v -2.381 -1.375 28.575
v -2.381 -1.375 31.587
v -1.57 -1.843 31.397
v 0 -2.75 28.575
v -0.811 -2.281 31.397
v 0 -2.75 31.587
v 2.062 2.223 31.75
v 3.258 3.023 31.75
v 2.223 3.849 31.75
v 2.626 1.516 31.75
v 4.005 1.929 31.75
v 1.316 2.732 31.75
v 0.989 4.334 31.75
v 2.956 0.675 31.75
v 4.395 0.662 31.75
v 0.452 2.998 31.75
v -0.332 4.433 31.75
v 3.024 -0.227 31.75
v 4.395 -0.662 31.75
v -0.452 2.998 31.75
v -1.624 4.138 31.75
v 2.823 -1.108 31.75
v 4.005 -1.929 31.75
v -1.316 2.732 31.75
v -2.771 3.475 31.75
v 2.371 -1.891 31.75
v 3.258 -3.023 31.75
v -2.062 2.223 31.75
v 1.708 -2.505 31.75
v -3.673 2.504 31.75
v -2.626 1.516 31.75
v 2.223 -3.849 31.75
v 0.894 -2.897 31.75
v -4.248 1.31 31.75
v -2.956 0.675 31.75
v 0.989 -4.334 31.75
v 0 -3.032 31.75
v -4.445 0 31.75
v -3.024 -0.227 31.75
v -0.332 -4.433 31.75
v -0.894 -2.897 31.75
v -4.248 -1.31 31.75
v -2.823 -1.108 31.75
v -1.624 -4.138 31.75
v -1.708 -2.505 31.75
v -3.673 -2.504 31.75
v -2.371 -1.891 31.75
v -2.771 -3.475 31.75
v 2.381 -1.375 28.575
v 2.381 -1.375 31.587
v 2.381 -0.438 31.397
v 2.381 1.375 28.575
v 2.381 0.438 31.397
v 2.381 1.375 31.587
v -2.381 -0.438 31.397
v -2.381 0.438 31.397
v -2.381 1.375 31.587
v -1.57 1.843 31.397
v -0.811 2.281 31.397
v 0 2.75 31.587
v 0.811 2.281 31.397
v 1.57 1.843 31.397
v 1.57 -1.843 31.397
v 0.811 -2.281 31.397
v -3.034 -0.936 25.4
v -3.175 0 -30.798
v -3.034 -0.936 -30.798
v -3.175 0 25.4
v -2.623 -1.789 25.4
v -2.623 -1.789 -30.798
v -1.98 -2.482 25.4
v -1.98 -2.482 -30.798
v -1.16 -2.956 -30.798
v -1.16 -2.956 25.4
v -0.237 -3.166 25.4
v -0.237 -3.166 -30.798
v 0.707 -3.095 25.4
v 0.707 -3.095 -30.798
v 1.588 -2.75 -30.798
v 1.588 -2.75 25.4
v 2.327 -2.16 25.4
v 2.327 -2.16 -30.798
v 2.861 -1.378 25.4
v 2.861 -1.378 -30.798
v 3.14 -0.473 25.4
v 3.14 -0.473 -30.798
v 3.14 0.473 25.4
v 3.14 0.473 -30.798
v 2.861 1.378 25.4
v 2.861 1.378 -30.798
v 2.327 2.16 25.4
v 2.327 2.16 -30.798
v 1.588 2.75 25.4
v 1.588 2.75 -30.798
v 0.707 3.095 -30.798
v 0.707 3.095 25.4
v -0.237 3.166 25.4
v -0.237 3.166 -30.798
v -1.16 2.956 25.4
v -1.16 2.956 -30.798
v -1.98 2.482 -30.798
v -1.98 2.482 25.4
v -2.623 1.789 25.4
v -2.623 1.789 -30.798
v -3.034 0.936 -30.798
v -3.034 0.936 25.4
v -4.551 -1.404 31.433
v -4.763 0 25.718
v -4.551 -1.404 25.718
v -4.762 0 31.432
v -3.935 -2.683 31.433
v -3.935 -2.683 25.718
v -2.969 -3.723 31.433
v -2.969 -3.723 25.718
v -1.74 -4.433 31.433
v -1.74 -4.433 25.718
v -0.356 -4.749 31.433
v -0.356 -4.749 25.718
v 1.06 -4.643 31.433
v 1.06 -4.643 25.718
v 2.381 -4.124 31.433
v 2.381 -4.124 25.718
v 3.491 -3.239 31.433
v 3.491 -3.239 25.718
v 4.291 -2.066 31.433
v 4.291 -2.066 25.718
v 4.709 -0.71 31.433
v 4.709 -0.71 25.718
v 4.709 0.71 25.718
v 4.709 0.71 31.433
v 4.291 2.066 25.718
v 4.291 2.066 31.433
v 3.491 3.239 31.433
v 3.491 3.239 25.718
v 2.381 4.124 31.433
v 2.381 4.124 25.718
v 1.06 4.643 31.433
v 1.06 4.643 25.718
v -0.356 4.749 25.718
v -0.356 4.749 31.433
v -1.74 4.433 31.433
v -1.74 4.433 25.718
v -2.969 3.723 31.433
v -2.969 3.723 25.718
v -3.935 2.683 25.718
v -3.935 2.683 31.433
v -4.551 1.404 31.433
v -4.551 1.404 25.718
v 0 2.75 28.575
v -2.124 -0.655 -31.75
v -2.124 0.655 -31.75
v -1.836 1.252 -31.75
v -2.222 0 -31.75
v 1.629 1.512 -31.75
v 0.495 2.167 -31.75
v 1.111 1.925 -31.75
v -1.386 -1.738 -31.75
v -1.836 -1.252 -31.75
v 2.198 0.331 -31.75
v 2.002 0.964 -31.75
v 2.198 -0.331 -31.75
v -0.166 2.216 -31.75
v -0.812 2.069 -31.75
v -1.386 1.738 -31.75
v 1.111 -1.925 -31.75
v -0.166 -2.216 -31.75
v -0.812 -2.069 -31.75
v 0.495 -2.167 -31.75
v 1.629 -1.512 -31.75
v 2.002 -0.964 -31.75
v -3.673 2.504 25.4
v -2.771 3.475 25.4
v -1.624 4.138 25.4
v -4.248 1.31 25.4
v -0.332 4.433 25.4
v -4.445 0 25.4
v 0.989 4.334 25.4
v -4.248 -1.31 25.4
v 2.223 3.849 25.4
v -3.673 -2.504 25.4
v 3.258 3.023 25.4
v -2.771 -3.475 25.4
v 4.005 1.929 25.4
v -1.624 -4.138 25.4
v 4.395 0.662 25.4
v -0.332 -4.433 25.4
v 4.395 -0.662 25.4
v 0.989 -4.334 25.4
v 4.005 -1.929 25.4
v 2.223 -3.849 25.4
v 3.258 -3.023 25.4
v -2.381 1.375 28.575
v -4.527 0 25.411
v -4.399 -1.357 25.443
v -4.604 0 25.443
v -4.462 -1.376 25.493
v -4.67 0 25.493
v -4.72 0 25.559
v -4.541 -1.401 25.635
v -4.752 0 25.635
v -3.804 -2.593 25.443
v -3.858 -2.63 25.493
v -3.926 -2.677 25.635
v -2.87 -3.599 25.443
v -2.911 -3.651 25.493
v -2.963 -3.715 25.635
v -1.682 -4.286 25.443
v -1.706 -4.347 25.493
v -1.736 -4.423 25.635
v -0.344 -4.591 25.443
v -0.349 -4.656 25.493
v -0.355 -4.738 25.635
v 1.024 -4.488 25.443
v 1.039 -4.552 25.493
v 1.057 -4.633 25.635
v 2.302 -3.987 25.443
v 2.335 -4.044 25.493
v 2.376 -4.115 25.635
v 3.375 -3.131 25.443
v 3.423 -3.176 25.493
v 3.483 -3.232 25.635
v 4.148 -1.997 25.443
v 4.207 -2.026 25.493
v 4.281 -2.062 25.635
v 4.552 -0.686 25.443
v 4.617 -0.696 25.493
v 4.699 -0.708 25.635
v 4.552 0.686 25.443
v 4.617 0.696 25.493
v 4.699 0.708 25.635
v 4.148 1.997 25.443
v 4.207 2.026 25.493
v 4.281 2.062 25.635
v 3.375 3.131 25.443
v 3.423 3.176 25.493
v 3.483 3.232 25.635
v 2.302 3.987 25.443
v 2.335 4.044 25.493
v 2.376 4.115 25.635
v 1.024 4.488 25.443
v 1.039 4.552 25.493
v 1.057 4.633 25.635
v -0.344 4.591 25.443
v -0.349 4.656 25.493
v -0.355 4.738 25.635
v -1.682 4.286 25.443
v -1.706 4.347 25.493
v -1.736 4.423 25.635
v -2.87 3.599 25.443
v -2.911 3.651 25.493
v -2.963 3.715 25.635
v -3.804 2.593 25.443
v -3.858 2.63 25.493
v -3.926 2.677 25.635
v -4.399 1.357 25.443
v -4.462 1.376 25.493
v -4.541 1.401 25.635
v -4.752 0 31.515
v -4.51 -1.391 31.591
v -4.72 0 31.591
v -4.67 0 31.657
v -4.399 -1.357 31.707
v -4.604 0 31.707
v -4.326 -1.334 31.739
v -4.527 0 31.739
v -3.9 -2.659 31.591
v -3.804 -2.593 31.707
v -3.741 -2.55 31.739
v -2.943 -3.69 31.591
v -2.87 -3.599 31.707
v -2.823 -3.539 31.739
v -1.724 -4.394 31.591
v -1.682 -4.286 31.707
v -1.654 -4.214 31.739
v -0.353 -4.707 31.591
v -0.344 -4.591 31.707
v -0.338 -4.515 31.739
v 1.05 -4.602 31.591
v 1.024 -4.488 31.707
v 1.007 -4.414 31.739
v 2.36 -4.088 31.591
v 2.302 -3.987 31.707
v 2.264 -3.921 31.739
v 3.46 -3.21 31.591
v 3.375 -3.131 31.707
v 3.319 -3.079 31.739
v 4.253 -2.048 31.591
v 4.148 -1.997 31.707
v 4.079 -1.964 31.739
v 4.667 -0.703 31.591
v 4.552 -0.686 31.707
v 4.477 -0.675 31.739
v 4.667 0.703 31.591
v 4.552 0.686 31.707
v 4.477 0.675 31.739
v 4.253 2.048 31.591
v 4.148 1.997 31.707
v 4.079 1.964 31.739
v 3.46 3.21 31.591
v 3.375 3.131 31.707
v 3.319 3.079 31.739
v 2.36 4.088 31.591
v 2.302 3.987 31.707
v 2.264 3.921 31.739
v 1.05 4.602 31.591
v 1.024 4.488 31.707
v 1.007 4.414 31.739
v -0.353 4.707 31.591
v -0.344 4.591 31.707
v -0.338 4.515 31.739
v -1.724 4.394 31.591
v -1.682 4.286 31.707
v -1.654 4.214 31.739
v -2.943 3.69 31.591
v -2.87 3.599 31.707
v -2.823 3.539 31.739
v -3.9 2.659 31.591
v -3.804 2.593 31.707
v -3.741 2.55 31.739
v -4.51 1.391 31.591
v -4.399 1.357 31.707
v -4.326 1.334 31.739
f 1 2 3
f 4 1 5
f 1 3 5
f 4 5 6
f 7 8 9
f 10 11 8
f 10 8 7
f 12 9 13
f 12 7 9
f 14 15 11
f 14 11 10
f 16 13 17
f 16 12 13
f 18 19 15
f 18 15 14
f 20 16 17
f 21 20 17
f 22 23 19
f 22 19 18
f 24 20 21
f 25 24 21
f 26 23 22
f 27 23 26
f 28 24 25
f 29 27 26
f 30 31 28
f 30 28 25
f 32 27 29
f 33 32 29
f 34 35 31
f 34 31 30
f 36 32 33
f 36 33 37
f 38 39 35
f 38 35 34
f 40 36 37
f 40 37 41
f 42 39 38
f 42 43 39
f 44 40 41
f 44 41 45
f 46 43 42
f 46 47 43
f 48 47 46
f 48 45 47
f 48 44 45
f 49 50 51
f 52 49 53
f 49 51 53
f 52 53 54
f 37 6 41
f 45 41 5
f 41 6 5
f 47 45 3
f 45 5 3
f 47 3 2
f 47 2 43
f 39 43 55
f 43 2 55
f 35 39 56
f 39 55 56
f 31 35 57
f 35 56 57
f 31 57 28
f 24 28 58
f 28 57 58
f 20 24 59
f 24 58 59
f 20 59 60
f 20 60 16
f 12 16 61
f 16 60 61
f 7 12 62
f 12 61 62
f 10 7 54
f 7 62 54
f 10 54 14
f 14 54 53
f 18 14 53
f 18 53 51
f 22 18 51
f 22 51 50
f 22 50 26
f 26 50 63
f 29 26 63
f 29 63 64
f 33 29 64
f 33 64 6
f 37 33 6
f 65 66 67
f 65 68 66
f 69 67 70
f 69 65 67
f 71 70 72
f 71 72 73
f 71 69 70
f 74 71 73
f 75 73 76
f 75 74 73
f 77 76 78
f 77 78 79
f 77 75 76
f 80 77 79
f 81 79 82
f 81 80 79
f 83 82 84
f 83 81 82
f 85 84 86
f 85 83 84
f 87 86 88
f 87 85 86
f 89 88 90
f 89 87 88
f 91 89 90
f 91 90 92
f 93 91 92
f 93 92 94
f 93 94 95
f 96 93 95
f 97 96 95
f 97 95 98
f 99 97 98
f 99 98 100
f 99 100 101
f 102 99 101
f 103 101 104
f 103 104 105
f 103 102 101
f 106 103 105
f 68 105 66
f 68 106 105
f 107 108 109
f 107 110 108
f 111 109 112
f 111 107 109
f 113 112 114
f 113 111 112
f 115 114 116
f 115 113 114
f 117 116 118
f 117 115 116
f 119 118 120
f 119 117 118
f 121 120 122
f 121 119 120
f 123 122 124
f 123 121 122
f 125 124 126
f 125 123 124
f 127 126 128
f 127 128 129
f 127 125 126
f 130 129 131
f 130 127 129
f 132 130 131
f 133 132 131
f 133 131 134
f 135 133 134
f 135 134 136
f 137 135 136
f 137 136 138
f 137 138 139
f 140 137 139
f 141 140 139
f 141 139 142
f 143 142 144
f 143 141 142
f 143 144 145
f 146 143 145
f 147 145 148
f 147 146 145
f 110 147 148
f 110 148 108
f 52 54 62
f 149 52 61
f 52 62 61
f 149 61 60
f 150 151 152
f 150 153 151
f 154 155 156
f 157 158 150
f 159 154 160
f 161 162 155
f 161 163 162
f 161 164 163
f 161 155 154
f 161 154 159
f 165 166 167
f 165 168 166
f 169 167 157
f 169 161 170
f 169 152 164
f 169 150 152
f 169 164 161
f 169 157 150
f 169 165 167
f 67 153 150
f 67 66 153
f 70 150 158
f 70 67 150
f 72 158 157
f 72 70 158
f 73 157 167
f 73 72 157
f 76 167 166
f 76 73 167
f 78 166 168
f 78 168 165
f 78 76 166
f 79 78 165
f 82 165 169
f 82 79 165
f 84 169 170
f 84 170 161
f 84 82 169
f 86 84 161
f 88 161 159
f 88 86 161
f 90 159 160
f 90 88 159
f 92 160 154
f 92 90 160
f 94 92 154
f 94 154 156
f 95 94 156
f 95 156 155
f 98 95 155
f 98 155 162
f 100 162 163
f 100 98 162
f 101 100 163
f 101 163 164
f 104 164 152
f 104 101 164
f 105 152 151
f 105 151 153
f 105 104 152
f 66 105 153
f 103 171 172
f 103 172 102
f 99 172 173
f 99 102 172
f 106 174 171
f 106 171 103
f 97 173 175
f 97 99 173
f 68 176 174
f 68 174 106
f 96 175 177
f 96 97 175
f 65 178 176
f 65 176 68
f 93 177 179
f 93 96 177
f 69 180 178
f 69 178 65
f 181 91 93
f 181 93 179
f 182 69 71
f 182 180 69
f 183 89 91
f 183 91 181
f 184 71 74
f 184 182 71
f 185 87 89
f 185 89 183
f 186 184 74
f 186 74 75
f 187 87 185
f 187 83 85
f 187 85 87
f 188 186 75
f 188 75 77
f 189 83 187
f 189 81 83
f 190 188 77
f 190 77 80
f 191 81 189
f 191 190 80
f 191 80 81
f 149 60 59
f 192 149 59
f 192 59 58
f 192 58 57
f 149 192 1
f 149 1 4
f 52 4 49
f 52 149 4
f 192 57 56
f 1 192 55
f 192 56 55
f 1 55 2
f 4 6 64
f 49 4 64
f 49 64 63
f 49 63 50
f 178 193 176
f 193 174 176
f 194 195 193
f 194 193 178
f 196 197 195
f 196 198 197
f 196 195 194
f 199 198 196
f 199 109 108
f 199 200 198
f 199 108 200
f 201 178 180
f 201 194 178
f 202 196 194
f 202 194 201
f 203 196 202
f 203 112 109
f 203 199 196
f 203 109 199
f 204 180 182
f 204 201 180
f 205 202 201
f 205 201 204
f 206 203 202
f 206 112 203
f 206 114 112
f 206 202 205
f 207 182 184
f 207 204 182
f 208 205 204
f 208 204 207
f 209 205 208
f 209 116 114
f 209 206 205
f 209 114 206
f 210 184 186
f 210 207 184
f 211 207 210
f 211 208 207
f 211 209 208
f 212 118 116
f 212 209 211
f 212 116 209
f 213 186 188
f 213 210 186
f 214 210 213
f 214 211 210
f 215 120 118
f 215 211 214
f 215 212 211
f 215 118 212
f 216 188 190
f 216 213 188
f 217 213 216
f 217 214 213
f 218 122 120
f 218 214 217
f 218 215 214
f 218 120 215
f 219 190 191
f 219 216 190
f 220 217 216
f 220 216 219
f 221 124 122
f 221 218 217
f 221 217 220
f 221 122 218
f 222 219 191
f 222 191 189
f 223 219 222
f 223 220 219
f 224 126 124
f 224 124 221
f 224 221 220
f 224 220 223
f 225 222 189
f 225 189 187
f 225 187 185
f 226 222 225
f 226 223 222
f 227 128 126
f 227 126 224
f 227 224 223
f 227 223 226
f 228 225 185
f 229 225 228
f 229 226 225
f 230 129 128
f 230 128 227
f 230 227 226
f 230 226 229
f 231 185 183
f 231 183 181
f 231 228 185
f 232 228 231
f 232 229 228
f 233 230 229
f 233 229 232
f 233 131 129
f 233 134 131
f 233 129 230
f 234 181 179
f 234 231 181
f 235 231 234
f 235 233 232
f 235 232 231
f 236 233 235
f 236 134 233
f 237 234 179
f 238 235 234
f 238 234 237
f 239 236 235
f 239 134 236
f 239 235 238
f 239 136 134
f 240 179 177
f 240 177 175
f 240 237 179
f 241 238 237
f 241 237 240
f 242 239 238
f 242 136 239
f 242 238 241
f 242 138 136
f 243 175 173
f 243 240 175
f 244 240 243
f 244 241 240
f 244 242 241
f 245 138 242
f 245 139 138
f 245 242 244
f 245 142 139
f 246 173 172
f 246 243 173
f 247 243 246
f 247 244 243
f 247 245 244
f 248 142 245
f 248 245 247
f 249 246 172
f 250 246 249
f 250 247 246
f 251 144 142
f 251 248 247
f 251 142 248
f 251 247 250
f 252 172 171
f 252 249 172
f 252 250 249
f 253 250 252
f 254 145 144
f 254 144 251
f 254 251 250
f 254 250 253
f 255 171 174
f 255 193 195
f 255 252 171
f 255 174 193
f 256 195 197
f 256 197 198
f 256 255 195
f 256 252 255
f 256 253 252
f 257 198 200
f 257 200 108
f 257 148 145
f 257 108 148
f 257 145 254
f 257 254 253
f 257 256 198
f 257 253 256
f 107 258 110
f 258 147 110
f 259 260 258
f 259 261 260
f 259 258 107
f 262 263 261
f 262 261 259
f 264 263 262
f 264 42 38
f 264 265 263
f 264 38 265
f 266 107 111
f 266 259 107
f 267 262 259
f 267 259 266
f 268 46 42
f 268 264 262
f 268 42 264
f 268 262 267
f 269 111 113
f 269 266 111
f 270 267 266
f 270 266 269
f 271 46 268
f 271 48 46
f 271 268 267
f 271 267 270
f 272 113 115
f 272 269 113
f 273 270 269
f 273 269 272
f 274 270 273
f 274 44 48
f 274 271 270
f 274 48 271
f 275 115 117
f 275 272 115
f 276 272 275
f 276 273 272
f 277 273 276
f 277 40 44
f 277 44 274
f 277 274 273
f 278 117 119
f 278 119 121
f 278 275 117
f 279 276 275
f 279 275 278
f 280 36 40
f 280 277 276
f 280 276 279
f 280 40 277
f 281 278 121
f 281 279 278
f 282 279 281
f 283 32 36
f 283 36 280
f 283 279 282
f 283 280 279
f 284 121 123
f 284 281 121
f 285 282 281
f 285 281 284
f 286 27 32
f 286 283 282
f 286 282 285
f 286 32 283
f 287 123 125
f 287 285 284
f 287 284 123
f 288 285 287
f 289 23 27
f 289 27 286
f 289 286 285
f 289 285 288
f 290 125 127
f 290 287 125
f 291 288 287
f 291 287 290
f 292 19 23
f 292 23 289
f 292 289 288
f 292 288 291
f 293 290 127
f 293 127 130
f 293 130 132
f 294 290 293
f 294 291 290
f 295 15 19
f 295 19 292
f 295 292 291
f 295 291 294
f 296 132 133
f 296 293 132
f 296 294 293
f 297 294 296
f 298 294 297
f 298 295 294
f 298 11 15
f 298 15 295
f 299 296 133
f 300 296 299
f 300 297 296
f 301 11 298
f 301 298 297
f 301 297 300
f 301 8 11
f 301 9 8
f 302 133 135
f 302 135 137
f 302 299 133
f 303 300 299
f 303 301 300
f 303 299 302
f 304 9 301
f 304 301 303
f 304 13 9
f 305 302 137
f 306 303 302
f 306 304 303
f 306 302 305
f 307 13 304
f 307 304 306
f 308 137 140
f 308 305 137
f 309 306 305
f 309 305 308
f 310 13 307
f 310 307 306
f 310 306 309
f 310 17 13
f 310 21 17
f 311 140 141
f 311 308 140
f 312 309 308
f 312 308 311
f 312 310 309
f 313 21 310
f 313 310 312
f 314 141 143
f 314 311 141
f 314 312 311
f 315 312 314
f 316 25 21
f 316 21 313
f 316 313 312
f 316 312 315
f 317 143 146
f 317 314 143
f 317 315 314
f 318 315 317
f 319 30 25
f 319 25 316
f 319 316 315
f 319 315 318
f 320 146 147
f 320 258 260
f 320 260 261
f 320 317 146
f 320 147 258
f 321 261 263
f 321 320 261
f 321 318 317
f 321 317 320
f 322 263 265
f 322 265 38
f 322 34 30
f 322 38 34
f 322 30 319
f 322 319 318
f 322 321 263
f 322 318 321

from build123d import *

# Parameters (mm, degrees)
CUT_EXTRUDE1_START = 31.75
CUT_EXTRUDE1_DEPTH = 3.175


with BuildPart() as part:
    # Sketch2 → Revolve1 (revolve)
    with BuildSketch(Plane(origin=(0, 0, 0), x_dir=(0, 0, -1), z_dir=(1, 0, 0)), mode=Mode.PRIVATE) as revolve1_sk:
        with BuildLine():
            Line((31.75, 0), (31.75, 2.2225))
            Line((31.75, 2.2225), (30.7975, 3.175))
            Line((30.7975, 3.175), (-25.4, 3.175))
            Line((-25.4, 3.175), (-25.4, 4.445))
            ThreePointArc((-25.4, 4.445), (-25.492993597, 4.669506403), (-25.7175, 4.7625))
            Line((-25.7175, 4.7625), (-31.4325, 4.7625))
            ThreePointArc((-31.4325, 4.7625), (-31.657006403, 4.669506403), (-31.75, 4.445))
            Line((-31.75, 4.445), (-31.75, 0))
            Line((-31.75, 0), (31.75, 0))
        make_face()
    revolve(revolve1_sk.sketch.rotate(Axis((0, 0, -31.75), (0, 0, 1)), 90), axis=Axis((0, 0, -31.75), (0, 0, 1)))

    # Sketch3 → Cut-Extrude1 (cut)
    with BuildSketch(Plane.XY.offset(CUT_EXTRUDE1_START)):
        Polygon((-2.38125, 1.374815329), (-2.38125, -1.374815329), (0, -2.749630657), (2.38125, -1.374815329), (2.38125, 1.374815329), (0, 2.749630657), align=None)
    extrude(amount=-CUT_EXTRUDE1_DEPTH, mode=Mode.SUBTRACT)

    # Cut-Extrude2 cone 1 section (through the dimple's axis) → Cut-Extrude2 (revolve, cut)
    with BuildSketch(Plane(origin=(0, 0, 31.75), x_dir=(0, -1, 0), z_dir=(1, 0, 0))):
        Polygon((0, 0), (3.032192214, 0), (0, 1.750636991), align=None)
    revolve(axis=Axis((0, 0, 31.75), (0, 0, -1)), mode=Mode.SUBTRACT)


solid = part.part
